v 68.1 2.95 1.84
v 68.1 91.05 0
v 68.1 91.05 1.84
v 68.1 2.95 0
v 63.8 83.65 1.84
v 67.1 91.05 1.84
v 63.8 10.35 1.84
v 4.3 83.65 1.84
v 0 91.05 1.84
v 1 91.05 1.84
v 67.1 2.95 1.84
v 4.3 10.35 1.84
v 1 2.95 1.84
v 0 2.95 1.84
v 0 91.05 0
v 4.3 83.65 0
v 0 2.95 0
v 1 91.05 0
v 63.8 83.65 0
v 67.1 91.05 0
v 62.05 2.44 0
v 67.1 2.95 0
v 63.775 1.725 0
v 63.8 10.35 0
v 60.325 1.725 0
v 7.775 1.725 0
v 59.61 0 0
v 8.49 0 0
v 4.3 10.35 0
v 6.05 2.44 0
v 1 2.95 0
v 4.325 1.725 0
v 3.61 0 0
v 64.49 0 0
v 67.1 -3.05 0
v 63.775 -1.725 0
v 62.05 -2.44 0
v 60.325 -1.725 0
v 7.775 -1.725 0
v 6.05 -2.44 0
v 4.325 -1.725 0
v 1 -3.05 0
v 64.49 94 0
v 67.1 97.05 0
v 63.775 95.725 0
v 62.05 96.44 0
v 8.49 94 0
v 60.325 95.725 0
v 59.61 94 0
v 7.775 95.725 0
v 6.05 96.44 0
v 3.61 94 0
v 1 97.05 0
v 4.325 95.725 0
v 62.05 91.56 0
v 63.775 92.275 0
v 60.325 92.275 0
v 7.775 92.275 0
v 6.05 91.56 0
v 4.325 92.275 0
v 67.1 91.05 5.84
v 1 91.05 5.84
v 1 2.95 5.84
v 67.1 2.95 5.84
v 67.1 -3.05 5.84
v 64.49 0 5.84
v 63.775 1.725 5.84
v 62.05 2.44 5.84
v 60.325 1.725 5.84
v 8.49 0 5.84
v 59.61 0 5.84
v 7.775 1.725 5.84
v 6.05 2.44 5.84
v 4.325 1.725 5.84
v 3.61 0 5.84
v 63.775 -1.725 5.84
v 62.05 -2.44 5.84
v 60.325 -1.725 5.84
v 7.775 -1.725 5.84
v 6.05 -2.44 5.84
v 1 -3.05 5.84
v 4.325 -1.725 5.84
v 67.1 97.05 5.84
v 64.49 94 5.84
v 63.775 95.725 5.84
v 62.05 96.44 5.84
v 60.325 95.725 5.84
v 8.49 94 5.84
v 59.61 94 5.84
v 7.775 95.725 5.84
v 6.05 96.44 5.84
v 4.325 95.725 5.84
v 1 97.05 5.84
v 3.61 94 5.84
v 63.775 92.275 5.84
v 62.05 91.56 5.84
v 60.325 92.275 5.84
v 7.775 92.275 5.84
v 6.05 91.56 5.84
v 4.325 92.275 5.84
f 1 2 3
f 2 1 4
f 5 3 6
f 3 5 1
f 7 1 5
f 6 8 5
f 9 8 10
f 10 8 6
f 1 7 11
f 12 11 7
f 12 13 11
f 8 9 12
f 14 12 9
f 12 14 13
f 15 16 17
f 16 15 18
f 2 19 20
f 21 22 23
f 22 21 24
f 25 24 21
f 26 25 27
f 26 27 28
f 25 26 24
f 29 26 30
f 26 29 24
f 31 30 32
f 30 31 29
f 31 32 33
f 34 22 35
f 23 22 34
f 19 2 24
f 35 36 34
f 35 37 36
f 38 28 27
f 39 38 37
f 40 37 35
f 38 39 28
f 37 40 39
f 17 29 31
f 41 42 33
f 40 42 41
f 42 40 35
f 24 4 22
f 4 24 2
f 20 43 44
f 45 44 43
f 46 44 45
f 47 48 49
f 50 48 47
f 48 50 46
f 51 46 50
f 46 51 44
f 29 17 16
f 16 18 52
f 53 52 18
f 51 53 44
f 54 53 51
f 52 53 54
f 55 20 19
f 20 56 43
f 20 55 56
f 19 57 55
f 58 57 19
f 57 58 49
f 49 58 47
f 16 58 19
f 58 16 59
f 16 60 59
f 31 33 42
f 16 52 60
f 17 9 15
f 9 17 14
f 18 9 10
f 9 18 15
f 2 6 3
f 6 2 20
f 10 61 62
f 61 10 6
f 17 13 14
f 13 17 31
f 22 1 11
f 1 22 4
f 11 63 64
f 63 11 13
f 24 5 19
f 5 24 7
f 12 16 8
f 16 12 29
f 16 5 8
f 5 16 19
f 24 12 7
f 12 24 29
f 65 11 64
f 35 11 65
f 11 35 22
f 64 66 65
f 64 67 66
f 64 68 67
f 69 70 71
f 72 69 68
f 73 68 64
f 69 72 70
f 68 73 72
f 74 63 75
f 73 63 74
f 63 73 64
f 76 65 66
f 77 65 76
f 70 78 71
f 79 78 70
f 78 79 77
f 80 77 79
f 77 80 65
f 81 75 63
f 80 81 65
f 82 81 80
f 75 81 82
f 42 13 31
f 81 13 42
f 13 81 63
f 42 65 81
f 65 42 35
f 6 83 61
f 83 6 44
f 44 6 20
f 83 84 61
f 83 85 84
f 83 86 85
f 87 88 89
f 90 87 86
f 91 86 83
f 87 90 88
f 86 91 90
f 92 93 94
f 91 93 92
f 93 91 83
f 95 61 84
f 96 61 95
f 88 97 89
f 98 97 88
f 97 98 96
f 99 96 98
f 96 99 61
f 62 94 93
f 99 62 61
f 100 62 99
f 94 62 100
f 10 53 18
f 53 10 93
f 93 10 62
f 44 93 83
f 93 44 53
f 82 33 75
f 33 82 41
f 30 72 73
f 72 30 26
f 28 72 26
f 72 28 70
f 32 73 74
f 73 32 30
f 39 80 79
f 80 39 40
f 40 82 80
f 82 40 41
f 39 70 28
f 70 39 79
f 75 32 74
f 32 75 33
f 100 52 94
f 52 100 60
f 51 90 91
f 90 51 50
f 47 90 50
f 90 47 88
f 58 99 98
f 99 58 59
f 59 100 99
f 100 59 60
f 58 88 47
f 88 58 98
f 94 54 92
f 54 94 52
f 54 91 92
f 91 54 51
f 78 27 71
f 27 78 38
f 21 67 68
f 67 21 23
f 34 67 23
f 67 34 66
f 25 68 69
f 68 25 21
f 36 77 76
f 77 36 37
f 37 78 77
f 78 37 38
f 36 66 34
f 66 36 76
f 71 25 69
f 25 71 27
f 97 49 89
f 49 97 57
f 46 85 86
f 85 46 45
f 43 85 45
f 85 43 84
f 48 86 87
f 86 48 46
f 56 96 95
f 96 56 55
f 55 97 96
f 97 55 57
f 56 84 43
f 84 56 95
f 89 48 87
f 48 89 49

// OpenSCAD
//mounting brackets for Aurora XLX Light and LGA2011 "Narrow"
translate([0, 2.95, 0]){
	id = 59.5;
	hd = 73.3;
	w = 4.3;
	h = 7.4;
	t = 1.84;
	
	// main square with removed hole
	difference(){
		cube([2 * w + id, 2 * h + hd, t]);
		translate([w, h, 0]){
			cube([id, hd, t]);
		}
	}
	
	
	bw = 68.1; // outer width
	holesw = 56; // hole spacing width
	
	bh = 88.1;
	holesh = 94;
	
	conth = 6;
	contw = bw - 2;
	
	// north+south extensions and holes
	difference(){
		union(){
			for(i = [-conth, bh]){
				translate([1, i, 0]){
					cube([contw, conth, t + 4]);
				}
			}
		}
		for(i = [6.05, 62.05]){
			for(j = [-2.95, 91.05]){
				translate([i, j, 0]){
					cylinder(t + 4, 2.44, 2.44);
				}
			}
		}
	}
}
